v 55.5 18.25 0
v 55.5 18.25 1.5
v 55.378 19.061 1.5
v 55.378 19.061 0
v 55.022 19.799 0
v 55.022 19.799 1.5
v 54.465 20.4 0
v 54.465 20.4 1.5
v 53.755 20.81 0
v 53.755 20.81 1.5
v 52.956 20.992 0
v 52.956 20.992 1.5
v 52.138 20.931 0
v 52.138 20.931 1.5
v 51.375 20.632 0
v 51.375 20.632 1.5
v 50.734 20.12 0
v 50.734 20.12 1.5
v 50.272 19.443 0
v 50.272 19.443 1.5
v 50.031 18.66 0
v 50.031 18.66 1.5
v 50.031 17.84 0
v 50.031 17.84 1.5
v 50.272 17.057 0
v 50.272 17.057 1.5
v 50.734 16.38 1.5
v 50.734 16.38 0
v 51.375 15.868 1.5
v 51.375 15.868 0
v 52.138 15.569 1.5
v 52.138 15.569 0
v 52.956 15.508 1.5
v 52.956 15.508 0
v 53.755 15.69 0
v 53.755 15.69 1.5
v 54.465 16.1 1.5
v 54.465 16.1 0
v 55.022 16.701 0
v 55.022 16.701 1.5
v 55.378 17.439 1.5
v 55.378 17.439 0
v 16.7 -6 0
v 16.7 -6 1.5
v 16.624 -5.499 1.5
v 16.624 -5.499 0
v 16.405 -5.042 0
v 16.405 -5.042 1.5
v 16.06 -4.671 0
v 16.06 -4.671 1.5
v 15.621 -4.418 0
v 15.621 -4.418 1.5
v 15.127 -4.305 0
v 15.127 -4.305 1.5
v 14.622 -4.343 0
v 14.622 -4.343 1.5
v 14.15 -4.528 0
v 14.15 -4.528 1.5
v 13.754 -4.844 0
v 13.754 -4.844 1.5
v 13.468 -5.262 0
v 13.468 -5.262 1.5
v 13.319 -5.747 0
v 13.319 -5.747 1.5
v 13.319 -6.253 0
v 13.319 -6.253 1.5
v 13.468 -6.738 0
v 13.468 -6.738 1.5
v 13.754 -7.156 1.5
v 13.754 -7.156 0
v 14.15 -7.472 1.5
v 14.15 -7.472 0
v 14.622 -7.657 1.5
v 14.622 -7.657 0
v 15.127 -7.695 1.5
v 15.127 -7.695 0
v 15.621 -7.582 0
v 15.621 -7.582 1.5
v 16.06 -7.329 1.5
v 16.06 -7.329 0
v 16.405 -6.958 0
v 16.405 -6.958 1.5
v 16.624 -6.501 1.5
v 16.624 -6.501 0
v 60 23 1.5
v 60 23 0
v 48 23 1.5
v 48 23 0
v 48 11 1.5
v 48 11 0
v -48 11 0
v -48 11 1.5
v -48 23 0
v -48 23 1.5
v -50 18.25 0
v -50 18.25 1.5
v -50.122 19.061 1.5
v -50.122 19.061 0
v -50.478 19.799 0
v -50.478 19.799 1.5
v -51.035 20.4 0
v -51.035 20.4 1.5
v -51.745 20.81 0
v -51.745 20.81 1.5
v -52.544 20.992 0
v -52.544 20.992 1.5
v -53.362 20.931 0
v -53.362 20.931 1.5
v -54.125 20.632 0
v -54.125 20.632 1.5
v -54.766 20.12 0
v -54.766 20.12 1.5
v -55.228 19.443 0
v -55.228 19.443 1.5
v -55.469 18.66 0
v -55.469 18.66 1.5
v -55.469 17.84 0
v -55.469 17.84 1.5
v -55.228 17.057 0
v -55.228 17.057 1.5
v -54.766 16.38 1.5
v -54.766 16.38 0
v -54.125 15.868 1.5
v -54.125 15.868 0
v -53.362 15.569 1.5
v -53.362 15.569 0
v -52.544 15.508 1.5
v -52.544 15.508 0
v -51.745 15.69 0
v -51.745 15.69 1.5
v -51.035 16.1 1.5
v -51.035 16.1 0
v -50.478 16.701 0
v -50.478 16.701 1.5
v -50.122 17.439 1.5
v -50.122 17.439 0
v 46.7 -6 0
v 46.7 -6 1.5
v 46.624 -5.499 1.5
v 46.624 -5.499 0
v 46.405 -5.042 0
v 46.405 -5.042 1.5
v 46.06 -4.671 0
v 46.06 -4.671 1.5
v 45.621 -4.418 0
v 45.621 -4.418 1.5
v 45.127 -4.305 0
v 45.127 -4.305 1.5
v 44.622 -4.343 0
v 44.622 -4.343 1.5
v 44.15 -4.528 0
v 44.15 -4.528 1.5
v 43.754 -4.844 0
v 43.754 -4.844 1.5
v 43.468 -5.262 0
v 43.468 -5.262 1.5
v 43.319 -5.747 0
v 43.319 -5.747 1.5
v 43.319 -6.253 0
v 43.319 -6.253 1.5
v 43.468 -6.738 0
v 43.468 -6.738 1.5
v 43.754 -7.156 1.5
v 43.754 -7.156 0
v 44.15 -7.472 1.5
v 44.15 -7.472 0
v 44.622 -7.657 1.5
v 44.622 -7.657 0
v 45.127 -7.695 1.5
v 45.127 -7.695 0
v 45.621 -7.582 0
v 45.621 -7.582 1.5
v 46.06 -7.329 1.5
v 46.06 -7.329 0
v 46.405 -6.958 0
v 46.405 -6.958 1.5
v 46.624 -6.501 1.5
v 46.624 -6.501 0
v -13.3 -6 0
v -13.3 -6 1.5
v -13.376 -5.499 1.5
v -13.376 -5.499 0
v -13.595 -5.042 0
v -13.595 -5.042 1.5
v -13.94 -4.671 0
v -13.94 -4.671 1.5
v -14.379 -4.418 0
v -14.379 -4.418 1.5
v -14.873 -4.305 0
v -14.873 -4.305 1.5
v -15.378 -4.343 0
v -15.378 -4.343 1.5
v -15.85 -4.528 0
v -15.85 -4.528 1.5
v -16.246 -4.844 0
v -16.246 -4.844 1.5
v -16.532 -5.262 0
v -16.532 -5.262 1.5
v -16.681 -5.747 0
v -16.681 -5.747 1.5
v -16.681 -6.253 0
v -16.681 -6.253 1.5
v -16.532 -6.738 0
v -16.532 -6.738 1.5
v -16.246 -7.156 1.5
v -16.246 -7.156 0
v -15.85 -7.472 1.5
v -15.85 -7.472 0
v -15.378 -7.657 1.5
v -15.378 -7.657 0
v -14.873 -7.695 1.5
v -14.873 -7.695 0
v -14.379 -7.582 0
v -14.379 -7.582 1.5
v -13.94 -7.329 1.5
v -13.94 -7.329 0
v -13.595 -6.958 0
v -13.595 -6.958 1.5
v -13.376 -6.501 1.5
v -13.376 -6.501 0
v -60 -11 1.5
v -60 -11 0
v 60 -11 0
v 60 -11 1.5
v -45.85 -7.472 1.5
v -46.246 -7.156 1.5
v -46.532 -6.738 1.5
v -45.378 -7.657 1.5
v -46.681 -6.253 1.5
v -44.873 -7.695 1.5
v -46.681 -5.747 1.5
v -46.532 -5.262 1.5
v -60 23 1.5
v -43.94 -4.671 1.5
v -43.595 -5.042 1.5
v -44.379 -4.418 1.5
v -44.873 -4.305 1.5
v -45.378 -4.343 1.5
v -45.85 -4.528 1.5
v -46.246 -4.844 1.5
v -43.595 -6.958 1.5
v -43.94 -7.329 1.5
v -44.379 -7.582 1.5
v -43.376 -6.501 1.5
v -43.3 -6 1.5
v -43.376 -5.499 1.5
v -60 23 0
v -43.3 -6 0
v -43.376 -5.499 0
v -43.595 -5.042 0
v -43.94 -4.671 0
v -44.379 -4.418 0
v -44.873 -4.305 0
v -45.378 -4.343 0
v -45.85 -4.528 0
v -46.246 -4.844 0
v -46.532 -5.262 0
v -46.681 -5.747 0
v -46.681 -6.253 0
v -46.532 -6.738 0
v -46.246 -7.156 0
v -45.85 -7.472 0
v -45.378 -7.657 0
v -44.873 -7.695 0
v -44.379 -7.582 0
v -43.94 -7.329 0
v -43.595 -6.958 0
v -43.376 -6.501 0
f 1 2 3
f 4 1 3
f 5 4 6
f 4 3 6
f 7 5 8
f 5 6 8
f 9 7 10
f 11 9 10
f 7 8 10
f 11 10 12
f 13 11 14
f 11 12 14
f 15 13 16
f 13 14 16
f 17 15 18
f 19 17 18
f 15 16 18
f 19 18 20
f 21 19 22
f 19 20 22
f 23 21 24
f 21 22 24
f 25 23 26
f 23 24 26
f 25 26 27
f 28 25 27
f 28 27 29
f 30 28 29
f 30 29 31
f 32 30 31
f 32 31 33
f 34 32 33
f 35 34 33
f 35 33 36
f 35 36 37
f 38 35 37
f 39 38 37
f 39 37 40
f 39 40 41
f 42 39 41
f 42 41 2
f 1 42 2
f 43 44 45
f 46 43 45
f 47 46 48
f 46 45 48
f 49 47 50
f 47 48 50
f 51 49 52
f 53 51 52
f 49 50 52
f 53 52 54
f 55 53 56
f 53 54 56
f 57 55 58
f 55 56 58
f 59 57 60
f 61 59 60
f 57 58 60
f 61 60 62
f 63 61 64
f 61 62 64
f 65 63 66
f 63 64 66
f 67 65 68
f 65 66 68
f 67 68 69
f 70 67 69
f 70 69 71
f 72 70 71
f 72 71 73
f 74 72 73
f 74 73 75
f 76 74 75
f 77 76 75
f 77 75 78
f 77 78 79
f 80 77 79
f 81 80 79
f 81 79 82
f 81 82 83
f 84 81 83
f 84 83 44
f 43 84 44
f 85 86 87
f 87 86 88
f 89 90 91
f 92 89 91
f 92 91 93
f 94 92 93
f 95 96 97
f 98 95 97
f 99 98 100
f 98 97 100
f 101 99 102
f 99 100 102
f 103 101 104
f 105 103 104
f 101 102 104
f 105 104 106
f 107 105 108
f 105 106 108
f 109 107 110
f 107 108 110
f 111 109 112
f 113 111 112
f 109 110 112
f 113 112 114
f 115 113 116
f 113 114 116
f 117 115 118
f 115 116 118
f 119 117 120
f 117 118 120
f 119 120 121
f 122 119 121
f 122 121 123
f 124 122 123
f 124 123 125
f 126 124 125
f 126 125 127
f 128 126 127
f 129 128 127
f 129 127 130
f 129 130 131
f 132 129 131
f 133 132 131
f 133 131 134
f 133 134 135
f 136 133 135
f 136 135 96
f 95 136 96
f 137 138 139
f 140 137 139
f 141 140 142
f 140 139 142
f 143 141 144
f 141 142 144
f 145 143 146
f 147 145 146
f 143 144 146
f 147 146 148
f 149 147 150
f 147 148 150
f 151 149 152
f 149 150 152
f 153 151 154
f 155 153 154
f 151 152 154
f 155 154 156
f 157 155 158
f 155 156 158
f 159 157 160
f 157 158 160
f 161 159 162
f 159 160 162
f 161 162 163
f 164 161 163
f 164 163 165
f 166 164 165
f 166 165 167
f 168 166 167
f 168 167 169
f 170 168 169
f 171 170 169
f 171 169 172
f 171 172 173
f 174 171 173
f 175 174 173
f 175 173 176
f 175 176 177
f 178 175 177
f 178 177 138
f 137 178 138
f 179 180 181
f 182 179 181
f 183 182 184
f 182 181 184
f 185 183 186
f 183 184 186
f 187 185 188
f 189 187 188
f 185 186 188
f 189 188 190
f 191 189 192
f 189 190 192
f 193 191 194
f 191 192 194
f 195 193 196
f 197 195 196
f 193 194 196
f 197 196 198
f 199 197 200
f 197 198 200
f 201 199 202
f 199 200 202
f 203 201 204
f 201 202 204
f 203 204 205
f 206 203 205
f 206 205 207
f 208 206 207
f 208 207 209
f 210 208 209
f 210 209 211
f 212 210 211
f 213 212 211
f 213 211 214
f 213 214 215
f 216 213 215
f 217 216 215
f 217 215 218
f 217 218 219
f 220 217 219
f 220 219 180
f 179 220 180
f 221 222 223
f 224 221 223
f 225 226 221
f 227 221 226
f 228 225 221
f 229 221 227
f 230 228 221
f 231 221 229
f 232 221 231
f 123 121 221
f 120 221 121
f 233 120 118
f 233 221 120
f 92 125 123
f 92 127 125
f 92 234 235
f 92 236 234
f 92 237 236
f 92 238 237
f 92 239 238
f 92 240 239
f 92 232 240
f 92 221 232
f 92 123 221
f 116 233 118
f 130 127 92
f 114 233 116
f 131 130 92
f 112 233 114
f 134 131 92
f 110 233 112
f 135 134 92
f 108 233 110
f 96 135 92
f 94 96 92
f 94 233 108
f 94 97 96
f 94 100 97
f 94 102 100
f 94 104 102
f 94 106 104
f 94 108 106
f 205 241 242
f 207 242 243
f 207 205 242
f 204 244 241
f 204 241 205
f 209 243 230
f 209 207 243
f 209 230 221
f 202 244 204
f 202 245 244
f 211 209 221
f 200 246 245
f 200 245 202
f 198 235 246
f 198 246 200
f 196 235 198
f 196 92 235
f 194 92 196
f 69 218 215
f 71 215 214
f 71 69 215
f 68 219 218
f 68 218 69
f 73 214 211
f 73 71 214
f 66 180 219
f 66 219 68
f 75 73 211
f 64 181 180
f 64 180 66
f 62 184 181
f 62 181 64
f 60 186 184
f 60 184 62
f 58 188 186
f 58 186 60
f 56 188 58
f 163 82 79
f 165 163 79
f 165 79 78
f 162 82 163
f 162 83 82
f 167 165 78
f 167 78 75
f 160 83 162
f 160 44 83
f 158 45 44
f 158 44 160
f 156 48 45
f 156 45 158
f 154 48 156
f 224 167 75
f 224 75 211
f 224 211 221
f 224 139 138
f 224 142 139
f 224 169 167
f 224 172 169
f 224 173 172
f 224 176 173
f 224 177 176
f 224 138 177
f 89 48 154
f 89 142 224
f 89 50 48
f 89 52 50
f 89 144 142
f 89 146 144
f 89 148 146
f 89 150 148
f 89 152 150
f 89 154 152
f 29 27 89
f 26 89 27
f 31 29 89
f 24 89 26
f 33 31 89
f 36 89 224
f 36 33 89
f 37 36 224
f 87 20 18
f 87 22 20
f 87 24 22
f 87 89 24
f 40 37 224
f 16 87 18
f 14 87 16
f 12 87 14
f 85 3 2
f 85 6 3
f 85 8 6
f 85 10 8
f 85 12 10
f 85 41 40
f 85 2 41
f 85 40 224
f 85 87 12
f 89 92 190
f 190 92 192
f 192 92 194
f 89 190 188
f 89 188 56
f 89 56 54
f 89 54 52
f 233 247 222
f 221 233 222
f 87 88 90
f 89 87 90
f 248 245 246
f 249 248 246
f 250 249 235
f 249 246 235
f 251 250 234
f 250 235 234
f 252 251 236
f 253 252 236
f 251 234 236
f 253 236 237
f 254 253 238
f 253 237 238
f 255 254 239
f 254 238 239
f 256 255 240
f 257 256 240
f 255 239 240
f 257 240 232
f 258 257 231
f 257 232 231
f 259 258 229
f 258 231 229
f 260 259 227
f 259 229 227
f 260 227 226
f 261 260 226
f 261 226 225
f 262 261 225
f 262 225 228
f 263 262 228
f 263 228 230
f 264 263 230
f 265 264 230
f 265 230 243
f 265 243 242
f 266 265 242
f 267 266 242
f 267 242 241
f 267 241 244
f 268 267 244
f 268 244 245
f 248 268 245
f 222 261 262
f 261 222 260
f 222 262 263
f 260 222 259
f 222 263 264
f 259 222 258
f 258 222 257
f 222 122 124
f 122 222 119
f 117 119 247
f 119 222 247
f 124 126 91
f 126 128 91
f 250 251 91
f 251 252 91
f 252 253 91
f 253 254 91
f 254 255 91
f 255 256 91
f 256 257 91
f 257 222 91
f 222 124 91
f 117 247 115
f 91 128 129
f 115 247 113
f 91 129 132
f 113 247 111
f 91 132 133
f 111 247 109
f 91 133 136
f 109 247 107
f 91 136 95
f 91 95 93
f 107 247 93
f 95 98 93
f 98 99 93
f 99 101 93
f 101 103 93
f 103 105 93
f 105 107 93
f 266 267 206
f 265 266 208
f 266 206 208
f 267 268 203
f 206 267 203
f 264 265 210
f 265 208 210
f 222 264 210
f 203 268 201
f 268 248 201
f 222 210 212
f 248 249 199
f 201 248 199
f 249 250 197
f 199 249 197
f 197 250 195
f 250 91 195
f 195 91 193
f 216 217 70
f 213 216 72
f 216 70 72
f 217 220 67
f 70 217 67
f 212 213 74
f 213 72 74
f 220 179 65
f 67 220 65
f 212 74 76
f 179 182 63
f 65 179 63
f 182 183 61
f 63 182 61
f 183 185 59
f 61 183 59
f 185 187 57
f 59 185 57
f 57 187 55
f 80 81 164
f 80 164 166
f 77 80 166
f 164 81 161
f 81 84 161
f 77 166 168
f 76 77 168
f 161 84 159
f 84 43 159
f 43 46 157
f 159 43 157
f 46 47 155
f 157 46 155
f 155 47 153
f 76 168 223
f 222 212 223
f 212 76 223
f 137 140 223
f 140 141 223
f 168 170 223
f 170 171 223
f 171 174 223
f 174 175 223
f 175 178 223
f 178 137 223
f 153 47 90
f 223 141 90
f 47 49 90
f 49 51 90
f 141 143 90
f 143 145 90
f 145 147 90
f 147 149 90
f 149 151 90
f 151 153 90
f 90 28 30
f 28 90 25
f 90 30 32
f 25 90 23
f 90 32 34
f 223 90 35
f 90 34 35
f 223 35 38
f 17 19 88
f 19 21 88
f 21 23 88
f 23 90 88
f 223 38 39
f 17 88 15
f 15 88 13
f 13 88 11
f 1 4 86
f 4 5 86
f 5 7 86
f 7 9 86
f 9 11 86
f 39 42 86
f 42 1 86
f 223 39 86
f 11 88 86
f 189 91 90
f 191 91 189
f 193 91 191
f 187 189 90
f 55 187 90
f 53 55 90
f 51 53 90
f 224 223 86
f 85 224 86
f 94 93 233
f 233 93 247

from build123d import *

# Parameters (mm, degrees)
PAD_DEPTH     = 1.5
SKETCH001_R   = 1.7
HOLE_DEPTH    = 25
SKETCH002_R   = 2.75
HOLE001_DEPTH = 25


with BuildPart() as part:
    # Sketch → Pad (new body)
    with BuildSketch(Plane.XY):
        Polygon((-60, 11), (-60, -11), (60, -11), (60, 11), (60, 23), (48, 23), (48, 11), (-48, 11), (-48, 23), (-60, 23), align=None)
    extrude(amount=PAD_DEPTH)

    # Sketch001 (on Face8 of Pad) → Hole (cut)
    with BuildSketch(Plane.XY.offset(1.5)):
        with Locations((-45, -6)):
            Circle(SKETCH001_R)
        with Locations((-15, -6)):
            Circle(SKETCH001_R)
        with Locations((15, -6)):
            Circle(SKETCH001_R)
        with Locations((45, -6)):
            Circle(SKETCH001_R)
    extrude(amount=-HOLE_DEPTH, mode=Mode.SUBTRACT)

    # Sketch002 (on Face5 of Hole) → Hole001 (cut)
    with BuildSketch(Plane.XY.offset(1.5)):
        with Locations((52.75, 18.25)):
            Circle(SKETCH002_R)
        with Locations((-52.75, 18.25)):
            Circle(SKETCH002_R)
    extrude(amount=-HOLE001_DEPTH, mode=Mode.SUBTRACT)


solid = part.part
